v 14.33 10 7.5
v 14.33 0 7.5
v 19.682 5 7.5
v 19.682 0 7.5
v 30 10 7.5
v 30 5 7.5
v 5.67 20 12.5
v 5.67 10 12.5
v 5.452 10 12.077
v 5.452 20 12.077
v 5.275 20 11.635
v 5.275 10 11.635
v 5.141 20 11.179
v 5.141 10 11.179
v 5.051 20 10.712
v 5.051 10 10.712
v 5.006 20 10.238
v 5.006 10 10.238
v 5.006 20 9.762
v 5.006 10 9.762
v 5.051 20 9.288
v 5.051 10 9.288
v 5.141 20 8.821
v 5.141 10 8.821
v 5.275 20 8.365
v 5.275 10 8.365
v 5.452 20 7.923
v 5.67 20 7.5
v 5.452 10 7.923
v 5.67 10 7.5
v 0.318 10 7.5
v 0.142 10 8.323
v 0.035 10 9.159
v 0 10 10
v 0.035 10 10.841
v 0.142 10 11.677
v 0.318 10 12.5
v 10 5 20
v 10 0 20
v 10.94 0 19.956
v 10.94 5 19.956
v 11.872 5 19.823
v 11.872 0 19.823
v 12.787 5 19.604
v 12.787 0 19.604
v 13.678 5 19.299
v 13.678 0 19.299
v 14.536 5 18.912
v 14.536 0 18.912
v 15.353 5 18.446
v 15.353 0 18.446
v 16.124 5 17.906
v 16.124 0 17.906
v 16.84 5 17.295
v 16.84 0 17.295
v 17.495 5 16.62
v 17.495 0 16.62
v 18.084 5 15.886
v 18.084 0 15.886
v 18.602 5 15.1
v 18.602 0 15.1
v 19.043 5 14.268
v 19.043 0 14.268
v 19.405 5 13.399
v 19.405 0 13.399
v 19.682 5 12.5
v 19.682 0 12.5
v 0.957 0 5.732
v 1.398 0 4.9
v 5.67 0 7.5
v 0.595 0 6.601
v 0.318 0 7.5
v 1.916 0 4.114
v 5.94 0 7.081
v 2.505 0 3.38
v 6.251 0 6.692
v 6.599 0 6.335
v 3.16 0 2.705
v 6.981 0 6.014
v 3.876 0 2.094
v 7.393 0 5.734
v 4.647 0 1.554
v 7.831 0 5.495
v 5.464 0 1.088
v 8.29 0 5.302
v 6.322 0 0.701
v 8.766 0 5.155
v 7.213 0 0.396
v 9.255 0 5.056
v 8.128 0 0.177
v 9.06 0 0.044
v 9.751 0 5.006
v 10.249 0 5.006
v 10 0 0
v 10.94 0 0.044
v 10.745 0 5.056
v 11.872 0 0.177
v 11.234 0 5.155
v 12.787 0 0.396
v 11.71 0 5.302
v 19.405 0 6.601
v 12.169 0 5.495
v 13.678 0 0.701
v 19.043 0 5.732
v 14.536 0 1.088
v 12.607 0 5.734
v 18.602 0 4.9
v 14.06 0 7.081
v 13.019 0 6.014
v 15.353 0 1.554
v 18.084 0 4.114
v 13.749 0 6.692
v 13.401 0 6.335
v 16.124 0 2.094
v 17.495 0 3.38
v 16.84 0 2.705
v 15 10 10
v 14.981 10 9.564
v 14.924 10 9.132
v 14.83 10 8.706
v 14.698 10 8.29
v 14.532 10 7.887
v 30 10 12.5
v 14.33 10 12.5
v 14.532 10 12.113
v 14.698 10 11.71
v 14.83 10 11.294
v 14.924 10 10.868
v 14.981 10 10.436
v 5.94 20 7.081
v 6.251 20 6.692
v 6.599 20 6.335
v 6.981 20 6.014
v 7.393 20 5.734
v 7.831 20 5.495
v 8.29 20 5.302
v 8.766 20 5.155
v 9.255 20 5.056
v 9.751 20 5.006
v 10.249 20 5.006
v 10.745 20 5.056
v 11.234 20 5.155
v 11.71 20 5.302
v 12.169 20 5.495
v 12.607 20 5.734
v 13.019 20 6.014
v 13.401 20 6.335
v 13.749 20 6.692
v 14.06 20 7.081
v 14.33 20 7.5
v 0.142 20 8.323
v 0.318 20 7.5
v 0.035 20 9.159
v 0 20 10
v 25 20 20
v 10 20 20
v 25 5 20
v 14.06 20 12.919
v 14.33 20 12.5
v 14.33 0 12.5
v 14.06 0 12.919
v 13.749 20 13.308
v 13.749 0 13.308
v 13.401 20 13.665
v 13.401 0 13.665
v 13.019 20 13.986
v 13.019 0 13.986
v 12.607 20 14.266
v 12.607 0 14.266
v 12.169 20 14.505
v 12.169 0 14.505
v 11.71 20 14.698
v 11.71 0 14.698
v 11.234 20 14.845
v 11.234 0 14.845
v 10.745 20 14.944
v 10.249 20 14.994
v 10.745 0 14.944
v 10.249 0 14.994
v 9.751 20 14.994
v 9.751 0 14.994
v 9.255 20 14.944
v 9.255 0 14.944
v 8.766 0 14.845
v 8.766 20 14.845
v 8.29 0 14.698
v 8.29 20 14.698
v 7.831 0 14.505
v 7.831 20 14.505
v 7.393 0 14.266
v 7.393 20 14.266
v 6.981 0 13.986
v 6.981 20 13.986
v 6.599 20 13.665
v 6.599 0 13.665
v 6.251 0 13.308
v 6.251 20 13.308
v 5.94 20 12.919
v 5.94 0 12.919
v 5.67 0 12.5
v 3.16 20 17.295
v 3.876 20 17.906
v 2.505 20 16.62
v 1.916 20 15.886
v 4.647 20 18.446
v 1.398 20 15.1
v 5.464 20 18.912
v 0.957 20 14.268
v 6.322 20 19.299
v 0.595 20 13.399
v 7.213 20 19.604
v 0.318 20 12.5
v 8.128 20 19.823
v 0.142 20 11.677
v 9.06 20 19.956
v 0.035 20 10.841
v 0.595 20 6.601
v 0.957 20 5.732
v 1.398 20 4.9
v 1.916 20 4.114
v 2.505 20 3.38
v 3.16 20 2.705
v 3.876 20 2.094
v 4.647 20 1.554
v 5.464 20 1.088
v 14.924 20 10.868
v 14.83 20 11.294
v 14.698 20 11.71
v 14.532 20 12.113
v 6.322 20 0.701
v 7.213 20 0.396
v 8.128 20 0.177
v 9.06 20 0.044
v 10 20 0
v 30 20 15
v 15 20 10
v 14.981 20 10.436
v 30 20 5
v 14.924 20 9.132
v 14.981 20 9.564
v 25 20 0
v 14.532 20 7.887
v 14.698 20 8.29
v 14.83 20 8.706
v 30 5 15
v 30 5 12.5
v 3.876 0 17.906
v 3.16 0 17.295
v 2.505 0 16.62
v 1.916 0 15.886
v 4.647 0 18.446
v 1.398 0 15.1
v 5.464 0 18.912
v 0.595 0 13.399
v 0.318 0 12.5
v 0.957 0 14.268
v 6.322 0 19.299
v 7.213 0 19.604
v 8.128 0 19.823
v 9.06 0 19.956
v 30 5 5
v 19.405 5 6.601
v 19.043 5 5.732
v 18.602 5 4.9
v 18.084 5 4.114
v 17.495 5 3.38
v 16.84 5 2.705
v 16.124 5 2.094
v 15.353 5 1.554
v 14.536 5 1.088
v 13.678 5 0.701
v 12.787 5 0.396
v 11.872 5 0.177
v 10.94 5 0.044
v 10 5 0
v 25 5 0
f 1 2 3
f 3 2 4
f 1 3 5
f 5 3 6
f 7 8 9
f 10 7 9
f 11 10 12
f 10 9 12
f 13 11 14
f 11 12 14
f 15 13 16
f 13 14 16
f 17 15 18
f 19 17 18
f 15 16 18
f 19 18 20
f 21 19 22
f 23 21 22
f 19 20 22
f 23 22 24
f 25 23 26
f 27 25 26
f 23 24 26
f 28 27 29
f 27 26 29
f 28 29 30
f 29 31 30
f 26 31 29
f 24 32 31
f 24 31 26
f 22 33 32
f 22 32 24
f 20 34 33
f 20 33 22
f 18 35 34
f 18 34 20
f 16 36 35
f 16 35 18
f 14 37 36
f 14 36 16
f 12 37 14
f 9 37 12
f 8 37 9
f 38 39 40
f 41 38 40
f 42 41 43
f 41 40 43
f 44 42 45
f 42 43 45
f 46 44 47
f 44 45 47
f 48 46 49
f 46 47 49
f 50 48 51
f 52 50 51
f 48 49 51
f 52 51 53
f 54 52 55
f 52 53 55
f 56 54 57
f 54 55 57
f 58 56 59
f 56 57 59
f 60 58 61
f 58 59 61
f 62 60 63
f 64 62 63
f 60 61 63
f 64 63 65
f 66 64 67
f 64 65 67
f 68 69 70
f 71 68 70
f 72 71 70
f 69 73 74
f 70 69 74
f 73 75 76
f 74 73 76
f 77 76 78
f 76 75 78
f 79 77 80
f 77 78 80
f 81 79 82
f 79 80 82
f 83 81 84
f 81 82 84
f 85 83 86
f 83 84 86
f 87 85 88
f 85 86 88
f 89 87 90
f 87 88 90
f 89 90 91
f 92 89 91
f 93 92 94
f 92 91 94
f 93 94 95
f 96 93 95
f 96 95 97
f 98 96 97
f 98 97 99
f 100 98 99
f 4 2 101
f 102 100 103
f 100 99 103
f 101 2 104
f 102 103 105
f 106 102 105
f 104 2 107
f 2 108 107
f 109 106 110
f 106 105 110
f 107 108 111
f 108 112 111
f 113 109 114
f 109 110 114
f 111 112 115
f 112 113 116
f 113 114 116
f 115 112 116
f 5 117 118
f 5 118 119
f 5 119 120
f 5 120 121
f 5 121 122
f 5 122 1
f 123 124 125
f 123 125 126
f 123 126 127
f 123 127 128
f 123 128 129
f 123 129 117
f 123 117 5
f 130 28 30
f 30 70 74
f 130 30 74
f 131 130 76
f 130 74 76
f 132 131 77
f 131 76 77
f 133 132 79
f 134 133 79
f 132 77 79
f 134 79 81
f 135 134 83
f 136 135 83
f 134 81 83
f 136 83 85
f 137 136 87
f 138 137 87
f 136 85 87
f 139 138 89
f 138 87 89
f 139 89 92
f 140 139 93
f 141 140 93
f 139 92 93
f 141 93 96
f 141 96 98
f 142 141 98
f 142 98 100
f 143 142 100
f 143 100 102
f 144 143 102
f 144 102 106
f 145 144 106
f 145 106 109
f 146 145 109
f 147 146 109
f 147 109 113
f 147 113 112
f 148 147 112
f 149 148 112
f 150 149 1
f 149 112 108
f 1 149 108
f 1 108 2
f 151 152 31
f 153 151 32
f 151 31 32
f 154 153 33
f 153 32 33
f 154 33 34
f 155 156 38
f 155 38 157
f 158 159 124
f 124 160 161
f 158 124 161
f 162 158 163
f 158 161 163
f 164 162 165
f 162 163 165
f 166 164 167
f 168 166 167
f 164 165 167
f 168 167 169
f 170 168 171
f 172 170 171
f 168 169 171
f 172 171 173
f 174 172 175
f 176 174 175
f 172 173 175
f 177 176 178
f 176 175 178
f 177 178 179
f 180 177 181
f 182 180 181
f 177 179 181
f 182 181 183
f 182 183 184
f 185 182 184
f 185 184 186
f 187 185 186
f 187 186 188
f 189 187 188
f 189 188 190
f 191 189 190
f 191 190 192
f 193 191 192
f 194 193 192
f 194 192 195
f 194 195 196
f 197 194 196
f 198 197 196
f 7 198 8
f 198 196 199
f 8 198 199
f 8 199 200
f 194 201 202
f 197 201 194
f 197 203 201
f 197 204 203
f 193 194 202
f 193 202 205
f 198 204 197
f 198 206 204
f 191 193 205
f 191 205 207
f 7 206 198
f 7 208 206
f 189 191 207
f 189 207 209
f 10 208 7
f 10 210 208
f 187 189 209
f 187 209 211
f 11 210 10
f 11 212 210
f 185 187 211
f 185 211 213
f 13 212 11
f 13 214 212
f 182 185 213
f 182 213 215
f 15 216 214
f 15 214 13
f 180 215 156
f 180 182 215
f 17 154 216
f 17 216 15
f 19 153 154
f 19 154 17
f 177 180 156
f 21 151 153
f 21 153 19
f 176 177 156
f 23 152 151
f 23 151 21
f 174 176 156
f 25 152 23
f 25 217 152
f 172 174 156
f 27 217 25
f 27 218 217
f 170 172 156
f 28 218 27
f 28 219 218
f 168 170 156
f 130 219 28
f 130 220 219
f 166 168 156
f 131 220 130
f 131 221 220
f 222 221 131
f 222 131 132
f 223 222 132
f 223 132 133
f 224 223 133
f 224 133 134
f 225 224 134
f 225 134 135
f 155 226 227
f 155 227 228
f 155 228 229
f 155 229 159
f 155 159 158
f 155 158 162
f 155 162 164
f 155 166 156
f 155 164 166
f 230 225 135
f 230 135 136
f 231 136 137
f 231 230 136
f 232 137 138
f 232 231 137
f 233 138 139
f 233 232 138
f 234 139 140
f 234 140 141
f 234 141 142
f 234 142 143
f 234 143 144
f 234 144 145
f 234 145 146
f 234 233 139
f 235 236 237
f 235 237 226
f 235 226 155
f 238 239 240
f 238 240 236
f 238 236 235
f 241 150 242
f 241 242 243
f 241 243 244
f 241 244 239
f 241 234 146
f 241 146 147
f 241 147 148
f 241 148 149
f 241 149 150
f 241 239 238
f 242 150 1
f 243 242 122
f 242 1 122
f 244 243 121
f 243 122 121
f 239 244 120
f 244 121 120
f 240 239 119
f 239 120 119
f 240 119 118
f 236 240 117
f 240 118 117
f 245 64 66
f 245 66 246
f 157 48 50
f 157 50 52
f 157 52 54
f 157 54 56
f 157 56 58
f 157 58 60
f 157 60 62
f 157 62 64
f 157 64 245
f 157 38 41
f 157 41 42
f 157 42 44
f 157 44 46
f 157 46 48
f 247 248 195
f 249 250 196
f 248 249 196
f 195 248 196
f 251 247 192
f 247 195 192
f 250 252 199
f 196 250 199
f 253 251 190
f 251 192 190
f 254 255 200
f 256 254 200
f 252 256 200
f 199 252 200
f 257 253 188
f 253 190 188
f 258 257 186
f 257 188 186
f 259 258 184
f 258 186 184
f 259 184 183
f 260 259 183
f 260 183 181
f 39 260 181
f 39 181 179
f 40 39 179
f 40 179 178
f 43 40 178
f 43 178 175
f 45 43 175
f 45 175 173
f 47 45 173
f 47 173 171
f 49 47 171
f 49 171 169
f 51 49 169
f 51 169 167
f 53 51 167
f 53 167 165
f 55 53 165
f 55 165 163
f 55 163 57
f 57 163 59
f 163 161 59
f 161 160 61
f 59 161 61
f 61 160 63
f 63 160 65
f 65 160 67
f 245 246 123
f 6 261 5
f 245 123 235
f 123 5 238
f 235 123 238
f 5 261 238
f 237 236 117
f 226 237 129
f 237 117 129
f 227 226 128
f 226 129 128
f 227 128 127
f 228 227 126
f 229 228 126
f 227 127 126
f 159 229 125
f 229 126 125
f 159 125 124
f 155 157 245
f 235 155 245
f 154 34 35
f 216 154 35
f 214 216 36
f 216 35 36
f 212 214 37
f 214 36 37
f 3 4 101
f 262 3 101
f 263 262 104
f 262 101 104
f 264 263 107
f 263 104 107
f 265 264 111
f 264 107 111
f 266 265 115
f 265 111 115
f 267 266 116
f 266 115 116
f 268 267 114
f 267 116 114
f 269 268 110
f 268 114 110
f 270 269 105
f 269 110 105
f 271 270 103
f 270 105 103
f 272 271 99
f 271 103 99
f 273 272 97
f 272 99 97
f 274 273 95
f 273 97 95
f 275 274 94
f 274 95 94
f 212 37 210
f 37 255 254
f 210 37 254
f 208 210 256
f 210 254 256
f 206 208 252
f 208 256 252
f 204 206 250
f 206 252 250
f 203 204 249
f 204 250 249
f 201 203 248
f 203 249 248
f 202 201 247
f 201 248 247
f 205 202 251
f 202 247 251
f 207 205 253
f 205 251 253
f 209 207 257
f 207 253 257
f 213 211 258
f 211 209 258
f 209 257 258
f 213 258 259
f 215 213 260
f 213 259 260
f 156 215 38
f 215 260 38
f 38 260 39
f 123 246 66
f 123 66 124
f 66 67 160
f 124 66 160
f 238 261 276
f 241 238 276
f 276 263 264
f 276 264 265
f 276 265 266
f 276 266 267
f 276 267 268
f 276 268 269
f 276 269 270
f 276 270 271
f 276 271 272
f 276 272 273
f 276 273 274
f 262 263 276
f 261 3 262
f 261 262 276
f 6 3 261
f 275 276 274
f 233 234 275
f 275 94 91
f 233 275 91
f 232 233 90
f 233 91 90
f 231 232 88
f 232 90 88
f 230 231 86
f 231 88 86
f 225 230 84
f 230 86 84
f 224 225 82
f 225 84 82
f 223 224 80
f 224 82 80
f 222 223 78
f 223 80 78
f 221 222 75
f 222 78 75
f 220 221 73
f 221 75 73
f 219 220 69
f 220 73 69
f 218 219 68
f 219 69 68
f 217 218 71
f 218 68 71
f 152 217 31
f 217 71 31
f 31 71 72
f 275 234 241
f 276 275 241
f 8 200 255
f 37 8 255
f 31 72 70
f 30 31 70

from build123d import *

# Parameters (mm, degrees)
F0_W     = 30
F0_H     = 20
F1_DEPTH = 20
F3_DEPTH = 20.001
F4_DEPTH = 10
F5_DEPTH = 5


with BuildPart() as f1:
    # F0 (on Top) → F1 (new body)
    with BuildSketch(Plane.XY):
        with Locations((15, 10)):
            Rectangle(F0_W, F0_H)
    extrude(amount=F1_DEPTH)

    # F2 (on face) → F3 (cut, through all)
    with BuildSketch(Plane.XZ):
        with BuildLine():
            ThreePointArc((0.3175416345, 12.5), (3.876275643, 17.9056941504), (10, 20))
            Line((10, 20), (0, 20))
            Line((0, 20), (0, 10.0000000432))
            ThreePointArc((0, 10.0000000432), (0.07970304, 11.2600429462), (0.3175416345, 12.5))
        make_face()
        with BuildLine():
            ThreePointArc((0.3175416345, 7.5), (0.0797030346, 8.7399570966), (0, 10.0000000432))
            Line((0, 10.0000000432), (0, 0))
            Line((0, 0), (10, 0))
            ThreePointArc((10, 0), (3.876275643, 2.0943058496), (0.3175416345, 7.5))
        make_face()
        with BuildLine():
            ThreePointArc((15, 10), (14.8296291314, 11.2940952255), (14.3301270189, 12.5))
            ThreePointArc((14.3301270189, 12.5), (10, 15), (5.6698729811, 12.5))
            ThreePointArc((5.6698729811, 12.5), (5, 10), (5.6698729811, 7.5))
            ThreePointArc((5.6698729811, 7.5), (10, 5), (14.3301270189, 7.5))
            ThreePointArc((14.3301270189, 7.5), (14.8296291314, 8.7059047745), (15, 10))
        make_face()
        Polygon((30, 20), (25, 20), (30, 15), align=None)
        Polygon((30, 0), (30, 5), (25, 0), align=None)
    extrude(amount=-F3_DEPTH, mode=Mode.SUBTRACT)

    # F2 (on face) → F4 (cut)
    with BuildSketch(Plane.XZ):
        with BuildLine():
            Line((30, 7.5), (30, 12.5))
            Line((30, 12.5), (19.6824583655, 12.5))
            Line((19.6824583655, 12.5), (14.3301270189, 12.5))
            ThreePointArc((14.3301270189, 12.5), (14.8296291314, 11.2940952255), (15, 10))
            ThreePointArc((15, 10), (14.8296291314, 8.7059047745), (14.3301270189, 7.5))
            Line((14.3301270189, 7.5), (19.6824583655, 7.5))
            Line((19.6824583655, 7.5), (30, 7.5))
        make_face()
        with BuildLine():
            Line((5.6698729811, 12.5), (0.3175416345, 12.5))
            ThreePointArc((0.3175416345, 12.5), (0.07970304, 11.2600429462), (0, 10.0000000432))
            ThreePointArc((0, 10.0000000432), (0.0797030346, 8.7399570966), (0.3175416345, 7.5))
            Line((0.3175416345, 7.5), (5.6698729811, 7.5))
            ThreePointArc((5.6698729811, 7.5), (5, 10), (5.6698729811, 12.5))
        make_face()
    extrude(amount=-F4_DEPTH, mode=Mode.SUBTRACT)

    # F2 (on face) → F5 (cut)
    with BuildSketch(Plane.XZ):
        with BuildLine():
            Line((30, 5), (30, 7.5))
            Line((30, 7.5), (19.6824583655, 7.5))
            ThreePointArc((19.6824583655, 7.5), (16.123724357, 2.0943058496), (10, 0))
            Line((10, 0), (25, 0))
            Line((25, 0), (30, 5))
        make_face()
        with BuildLine():
            Line((30, 15), (25, 20))
            Line((25, 20), (10, 20))
            ThreePointArc((10, 20), (16.123724357, 17.9056941504), (19.6824583655, 12.5))
            Line((19.6824583655, 12.5), (30, 12.5))
            Line((30, 12.5), (30, 15))
        make_face()
    extrude(amount=-F5_DEPTH, mode=Mode.SUBTRACT)


solid = f1.part
